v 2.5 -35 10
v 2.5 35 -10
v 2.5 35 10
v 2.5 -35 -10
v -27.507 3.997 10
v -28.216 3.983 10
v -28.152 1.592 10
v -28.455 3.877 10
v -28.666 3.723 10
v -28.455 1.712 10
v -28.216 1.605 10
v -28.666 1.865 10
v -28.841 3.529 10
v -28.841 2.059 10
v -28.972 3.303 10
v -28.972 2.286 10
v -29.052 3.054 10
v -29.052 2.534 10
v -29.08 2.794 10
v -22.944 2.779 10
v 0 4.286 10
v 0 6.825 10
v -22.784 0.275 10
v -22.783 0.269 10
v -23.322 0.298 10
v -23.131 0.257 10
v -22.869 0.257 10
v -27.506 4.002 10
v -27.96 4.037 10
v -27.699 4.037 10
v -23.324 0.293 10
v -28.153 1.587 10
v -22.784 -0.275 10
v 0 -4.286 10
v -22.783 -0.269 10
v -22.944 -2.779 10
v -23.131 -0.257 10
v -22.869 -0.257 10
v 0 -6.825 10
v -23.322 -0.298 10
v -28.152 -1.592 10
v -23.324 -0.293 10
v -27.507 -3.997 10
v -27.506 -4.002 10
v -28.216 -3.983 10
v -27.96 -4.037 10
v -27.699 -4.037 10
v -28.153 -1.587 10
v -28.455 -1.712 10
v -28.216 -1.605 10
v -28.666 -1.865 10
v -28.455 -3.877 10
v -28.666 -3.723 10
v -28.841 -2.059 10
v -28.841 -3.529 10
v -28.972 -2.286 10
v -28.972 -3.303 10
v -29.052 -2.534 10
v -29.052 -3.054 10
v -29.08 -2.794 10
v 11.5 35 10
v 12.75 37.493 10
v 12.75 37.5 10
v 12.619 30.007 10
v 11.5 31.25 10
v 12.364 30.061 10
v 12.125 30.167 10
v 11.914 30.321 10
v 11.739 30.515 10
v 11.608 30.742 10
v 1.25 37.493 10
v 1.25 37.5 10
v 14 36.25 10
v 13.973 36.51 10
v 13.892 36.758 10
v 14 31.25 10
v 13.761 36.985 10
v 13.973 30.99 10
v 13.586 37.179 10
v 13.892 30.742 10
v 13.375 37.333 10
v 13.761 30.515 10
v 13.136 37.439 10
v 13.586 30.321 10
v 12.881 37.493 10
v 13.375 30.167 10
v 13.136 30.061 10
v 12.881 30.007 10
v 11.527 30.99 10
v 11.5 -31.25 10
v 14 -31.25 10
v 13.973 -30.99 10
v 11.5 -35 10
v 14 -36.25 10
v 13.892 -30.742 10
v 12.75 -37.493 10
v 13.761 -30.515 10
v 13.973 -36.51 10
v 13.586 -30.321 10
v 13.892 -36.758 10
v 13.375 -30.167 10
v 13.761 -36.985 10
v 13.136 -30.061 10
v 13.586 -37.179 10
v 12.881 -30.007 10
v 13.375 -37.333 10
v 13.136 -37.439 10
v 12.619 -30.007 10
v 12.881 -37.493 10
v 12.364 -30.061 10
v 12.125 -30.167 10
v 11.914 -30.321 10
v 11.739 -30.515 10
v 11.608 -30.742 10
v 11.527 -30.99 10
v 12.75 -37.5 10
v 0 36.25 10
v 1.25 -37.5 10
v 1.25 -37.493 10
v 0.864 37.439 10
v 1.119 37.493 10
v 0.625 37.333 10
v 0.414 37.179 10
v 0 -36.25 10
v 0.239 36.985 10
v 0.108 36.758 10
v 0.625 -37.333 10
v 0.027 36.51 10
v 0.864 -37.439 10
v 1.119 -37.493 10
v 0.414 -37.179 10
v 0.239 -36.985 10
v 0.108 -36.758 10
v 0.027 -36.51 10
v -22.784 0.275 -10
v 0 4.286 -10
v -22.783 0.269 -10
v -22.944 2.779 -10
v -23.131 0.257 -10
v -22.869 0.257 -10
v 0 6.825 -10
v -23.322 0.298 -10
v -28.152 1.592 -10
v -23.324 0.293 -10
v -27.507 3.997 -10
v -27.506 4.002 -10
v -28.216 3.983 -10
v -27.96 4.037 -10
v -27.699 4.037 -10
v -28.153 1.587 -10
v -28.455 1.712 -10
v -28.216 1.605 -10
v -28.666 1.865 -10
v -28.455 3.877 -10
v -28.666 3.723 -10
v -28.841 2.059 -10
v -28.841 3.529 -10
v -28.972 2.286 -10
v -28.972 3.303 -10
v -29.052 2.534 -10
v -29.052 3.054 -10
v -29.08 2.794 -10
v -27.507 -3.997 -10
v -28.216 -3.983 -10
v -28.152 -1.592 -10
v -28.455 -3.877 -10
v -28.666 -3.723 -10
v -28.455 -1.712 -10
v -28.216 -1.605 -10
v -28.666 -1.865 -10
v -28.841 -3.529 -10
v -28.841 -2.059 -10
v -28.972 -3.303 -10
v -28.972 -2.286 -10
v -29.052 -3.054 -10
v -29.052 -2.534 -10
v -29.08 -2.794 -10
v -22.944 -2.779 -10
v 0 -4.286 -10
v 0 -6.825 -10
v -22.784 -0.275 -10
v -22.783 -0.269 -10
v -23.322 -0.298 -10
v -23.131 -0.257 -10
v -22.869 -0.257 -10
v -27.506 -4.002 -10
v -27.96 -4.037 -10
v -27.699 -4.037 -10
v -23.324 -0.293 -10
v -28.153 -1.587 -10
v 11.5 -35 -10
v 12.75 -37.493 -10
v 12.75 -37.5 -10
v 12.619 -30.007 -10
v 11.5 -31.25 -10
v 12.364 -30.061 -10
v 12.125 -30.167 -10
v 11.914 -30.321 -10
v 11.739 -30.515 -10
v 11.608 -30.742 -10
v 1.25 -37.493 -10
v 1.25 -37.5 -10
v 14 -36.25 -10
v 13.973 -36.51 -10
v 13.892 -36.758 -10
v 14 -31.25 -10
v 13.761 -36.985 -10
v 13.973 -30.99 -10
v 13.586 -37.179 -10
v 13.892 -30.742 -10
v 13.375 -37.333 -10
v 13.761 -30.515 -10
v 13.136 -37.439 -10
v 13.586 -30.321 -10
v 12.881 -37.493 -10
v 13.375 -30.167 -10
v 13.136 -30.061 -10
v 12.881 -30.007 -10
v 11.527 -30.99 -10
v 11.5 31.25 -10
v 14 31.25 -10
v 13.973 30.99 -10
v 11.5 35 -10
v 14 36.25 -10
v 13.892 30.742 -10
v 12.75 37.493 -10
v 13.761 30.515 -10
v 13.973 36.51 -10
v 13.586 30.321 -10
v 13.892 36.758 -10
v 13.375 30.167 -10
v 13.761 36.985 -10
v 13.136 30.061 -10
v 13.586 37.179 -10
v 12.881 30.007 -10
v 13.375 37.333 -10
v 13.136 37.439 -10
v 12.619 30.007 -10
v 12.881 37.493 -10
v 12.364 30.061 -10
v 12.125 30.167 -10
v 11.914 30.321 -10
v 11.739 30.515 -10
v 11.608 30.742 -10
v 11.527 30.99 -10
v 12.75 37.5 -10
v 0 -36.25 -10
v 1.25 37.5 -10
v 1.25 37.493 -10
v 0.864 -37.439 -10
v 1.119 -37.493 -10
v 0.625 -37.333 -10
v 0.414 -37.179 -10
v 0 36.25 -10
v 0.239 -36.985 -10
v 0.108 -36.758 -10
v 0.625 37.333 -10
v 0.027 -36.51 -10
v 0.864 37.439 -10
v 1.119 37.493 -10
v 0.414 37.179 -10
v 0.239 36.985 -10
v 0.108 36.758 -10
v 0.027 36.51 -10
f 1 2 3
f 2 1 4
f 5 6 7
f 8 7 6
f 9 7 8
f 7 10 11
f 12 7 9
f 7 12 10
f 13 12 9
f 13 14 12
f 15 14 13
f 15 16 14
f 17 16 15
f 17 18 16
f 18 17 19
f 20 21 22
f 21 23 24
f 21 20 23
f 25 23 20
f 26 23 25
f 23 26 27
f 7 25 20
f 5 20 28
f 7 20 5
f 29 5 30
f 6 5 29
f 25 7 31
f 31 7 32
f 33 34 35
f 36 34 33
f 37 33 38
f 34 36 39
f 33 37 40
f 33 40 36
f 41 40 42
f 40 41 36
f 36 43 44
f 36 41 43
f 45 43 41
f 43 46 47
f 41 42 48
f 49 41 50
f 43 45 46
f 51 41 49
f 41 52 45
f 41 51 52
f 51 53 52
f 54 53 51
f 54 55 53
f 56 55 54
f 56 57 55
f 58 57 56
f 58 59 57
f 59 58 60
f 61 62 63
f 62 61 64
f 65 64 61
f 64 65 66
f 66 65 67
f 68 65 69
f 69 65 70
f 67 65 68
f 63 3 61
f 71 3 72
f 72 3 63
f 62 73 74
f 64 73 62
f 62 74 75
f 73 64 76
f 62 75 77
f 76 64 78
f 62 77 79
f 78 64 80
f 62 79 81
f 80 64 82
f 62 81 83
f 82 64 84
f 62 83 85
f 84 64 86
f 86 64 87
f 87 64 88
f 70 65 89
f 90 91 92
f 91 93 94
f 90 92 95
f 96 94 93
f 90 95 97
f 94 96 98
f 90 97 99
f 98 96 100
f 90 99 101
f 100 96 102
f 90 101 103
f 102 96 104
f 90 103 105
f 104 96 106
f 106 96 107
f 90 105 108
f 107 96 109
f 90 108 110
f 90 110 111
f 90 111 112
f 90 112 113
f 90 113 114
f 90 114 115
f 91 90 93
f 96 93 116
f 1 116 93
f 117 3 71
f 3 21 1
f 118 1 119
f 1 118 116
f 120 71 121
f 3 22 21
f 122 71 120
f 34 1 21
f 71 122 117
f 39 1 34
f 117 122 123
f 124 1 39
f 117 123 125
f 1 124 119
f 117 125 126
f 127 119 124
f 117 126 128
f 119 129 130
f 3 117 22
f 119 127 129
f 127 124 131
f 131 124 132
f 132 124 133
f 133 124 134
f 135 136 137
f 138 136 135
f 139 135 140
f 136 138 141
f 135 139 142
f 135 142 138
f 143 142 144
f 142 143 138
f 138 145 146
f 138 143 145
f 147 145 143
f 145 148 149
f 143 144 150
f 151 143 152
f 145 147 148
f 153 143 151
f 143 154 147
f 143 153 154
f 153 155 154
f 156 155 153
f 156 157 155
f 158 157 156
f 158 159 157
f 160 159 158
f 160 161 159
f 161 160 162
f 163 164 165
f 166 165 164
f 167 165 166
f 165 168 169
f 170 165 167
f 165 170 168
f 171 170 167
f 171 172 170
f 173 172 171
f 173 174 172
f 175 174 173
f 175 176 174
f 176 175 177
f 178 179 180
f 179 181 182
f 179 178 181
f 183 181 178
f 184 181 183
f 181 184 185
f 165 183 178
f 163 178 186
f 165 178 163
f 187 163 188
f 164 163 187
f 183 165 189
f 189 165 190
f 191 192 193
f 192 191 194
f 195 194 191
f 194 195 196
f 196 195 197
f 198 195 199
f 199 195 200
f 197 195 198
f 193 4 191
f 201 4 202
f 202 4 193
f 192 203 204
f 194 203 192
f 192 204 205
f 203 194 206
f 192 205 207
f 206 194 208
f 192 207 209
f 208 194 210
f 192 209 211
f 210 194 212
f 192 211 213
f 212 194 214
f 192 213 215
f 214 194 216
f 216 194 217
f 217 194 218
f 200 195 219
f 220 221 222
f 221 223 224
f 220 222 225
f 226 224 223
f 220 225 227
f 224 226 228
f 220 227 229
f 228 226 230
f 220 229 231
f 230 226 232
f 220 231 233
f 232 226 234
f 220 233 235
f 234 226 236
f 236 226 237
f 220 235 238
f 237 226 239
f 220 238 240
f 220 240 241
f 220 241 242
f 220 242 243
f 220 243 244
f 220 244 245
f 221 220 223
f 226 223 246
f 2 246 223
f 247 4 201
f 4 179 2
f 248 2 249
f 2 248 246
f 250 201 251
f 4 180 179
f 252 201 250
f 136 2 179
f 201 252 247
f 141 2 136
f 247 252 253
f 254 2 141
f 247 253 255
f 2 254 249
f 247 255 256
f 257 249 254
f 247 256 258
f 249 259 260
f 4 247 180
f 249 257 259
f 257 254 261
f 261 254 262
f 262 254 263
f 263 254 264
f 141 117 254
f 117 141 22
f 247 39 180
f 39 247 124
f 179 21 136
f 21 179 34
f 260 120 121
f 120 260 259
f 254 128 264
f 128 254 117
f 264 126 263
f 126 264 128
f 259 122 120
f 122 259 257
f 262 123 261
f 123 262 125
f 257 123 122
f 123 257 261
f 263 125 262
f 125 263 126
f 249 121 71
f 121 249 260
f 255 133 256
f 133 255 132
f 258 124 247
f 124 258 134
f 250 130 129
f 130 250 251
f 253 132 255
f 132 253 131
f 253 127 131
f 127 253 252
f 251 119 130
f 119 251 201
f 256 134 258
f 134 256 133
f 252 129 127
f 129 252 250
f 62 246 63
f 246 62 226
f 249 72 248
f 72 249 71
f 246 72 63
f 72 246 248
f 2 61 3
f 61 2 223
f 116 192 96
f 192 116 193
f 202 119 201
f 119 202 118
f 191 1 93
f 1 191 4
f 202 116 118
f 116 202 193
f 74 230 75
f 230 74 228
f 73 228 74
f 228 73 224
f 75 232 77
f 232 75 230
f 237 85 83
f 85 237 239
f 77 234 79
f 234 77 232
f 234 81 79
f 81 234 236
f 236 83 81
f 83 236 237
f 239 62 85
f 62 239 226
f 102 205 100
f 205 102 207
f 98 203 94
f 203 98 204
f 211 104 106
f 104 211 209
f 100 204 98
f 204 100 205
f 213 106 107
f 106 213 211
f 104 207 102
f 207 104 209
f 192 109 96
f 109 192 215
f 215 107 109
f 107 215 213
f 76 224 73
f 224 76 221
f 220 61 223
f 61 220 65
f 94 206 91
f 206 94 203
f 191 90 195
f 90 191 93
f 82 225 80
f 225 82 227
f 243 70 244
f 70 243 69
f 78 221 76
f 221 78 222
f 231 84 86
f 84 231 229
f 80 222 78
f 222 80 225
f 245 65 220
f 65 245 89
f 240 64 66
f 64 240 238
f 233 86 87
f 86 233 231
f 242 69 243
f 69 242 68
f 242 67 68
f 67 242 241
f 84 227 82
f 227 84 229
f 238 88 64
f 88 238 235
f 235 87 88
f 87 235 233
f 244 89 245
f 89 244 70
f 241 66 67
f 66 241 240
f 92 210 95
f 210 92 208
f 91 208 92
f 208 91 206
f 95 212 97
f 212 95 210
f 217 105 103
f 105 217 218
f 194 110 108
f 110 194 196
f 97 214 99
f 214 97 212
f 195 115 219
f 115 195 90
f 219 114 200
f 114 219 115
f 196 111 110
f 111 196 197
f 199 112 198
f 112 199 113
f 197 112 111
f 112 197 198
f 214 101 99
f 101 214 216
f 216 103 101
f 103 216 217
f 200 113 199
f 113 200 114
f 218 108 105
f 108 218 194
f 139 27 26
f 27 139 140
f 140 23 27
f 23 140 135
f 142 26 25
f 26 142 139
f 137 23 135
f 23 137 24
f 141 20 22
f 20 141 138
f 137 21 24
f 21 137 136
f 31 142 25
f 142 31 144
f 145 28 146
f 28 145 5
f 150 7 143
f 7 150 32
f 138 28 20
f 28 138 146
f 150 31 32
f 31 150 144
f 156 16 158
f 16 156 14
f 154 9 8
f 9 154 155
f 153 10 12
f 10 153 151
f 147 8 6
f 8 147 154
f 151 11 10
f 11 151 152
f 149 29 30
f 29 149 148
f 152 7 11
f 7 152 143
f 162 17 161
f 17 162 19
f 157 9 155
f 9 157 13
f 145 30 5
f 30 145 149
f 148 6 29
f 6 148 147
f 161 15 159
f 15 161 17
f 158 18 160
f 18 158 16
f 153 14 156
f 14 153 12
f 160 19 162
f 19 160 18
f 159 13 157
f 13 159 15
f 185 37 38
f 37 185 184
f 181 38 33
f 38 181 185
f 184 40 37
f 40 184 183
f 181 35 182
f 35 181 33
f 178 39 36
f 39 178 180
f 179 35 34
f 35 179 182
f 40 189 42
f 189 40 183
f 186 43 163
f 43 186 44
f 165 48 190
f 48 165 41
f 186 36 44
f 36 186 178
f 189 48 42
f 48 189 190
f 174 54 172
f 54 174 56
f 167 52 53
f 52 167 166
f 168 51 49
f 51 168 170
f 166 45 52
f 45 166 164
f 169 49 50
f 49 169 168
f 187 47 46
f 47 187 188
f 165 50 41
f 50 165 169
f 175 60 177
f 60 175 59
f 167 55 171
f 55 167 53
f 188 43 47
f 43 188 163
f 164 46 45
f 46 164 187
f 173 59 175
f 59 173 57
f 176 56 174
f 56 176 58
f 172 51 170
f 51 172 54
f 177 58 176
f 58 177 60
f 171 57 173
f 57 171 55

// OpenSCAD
//made by RevisionNr3

/* [Basic Settings] */

// Width of your smartphone (with cover if you use one) in mm (please note: numbers like 70, 70.1 and 70.15 work, but numbers like 70. and 70.10 generate errors in customizer).
smartphone_width=70; //
// Thickness of your smartphone (with cover if you use one) in mm.
smartphone_thickness=9; //
// Height of the printed part. 20mm is enough to hold a phone.
bracket_height=20;
// Thickness of the printed part. 2.5 to 3 mm is a good value. The thicker, the stronger the part and clamp.
thickness=2.5; //[1:0.1:6]
// Rotation of the clamp. Adjust if you don't have a horizontal air frame.
clamp_rotation=0; //[-70:1:70]
// Gap between the clamp. 0.5 works for most cars.
clamp_gap=0.5; //[0.1:0.1:5]
// Clamp length. A value around 25mm should work for most cars.
clamp_length=23;  //[15:1:50]

/* [Less important Settings] */

// Length of the small bracket ends
bracket_small_ends=5; //[3:1:15]
// Angle at which the clamp closes
clamp_angle1=20; //[15:1:35]
// Angle to center on air frame
clamp_angle2=30; //[30:1:45]
// Length of the small ends on the clamp
clamp_centering_length=5; //[3:1:10]

/* [hidden] */

//calculations
//------------

//calculate clamp height and width based on the previous parameters
clamp_width=calc_wc();
clamp_height=calc_hc();
clamp_width_rotated=calc_wc_rotated();
clamp_height_rotated=calc_hc_rotated();

// code for bracket
//----------------
bracket(thickness,bracket_height,smartphone_width,smartphone_thickness);

// code for clamp
//---------------
difference(){
    
rotate([clamp_rotation,0,0]){ //rotate the clamp around the angle, max 60°

clamp_one_side(thickness,clamp_length,clamp_height,clamp_gap);
mirror([0,1,0])
clamp_one_side(thickness,clamp_length,clamp_height,clamp_gap); 
}

//these cubes will cut off the top,bottom and sides of the clamps, so the clamp stays within the bracket's outside dimensions.
cube_for_cut();
mirror([0,0,1]) cube_for_cut();
cube_for_cut2();
mirror([0,1,0]) cube_for_cut2();
}

//modules
//-------

module bracket(thickness,height,smartphone_width,smartphone_thickness){
    
//long piece
    translate([thickness/2,0,0])
cube([thickness,smartphone_width+thickness,height],center=true);

//2 cylinders at end of long piece
translate([thickness/2,smartphone_width/2+thickness/2,0]) cylinder(h=height,r=thickness/2,center=true,$fn=30);

translate([thickness/2,-smartphone_width/2-thickness/2,0]) cylinder(h=height,r=thickness/2,center=true,$fn=30);

//2 short cubes to clamp phone
translate([smartphone_thickness/2+thickness,smartphone_width/2+thickness/2,0]) cube([smartphone_thickness+thickness,thickness,height],center=true);

translate([smartphone_thickness/2+thickness,-smartphone_width/2-thickness/2,0]) cube([smartphone_thickness+thickness,thickness,height],center=true);

//2 cylinders at end of previous cubes
translate([smartphone_thickness+3/2*thickness,smartphone_width/2+thickness/2,0]) cylinder(h=height,r=thickness/2,center=true,$fn=30);

translate([smartphone_thickness+3/2*thickness,-smartphone_width/2-thickness/2,0]) cylinder(h=height,r=thickness/2,center=true,$fn=30);

//2 cubes to keep smartphone in the bracket
translate([smartphone_thickness+3/2*thickness,smartphone_width/2-bracket_small_ends/2+thickness/2]) cube([thickness,bracket_small_ends,height],center=true);

translate([smartphone_thickness+3/2*thickness,-smartphone_width/2+bracket_small_ends/2-thickness/2,0]) cube([thickness,bracket_small_ends,height],center=true);

//2 cylinders at end of previous cubes
translate([smartphone_thickness+3/2*thickness,smartphone_width/2-bracket_small_ends+thickness/2,0]) cylinder(h=height,r=thickness/2,center=true,$fn=30);

translate([smartphone_thickness+3/2*thickness,-smartphone_width/2+bracket_small_ends-thickness/2,0]) cylinder(h=height,r=thickness/2,center=true,$fn=30);
}

module clamp_one_side(thickness,length,height,distance){
    
translate([-length,0,0]){    
//cylinder    
translate([0,thickness/2+distance/2,-height/2]) 
cylinder(r=thickness/2,h=height,$fn=30);

//cube
translate([0,thickness/2+distance/2,0])
rotate([0,0,clamp_angle1/2])
translate([1/2*(length/(cos(clamp_angle1/2))+thickness/2*tan(clamp_angle1/2)),0,0]) 
cube([length/cos(clamp_angle1/2)+thickness/2*tan(clamp_angle1/2),thickness,height],center=true);

//cube
translate([0,thickness/2+distance/2,0])
rotate([0,0,-clamp_angle2/2])
translate([-clamp_centering_length/2,0,0]) 
cube([clamp_centering_length,thickness,height],center=true);

//cylinder
translate([-cos(clamp_angle2/2)*clamp_centering_length,thickness/2+distance/2+sin(clamp_angle2/2)*clamp_centering_length,-height/2]) 
cylinder(r=thickness/2,h=height,$fn=30);
}
}

module cube_for_cut(){ //for cutting the clamp off in the length direction (length direction = x axis, same direction as smartphone thickness)
    
tl=calc_total_length();
tw=calc_total_width();

translate([-tl+thickness,-tw/2,bracket_height/2])
cube([tl,tw,clamp_height]);
}

module cube_for_cut2(){ //for cutting the clamp off in the width direction if needed (width direction = y axis, same direction as smartphone width)
    
tl=calc_total_length();
tw=calc_total_width();
    
translate([-tl+thickness,smartphone_width/2+thickness,-clamp_height/2])
cube([tl,tw,clamp_height]); 
}


//functions
//---------

function calc_wc()= //wc stands for width clamp
    2*clamp_length*tan(clamp_angle2/2)+2*thickness*cos(clamp_angle2/2)+clamp_gap;

function calc_hc()= //hc stands for height clamp
    bracket_height/abs(cos(clamp_rotation))+calc_wc()*abs(tan(clamp_rotation)); //wb stands for width bracket, a max for the maximal angle to which the clamp can be rotated (i take this to be 60°)

function calc_hc_rotated()=
    bracket_height+2*calc_wc()*abs(sin(clamp_rotation));

function calc_wc_rotated()=
    calc_wc()*abs(cos(clamp_rotation))+calc_hc()*abs(sin(clamp_rotation));

function calc_total_width()= //total width of the part (width in the same direction as smarthone width)
max(calc_wc_rotated(),smartphone_width+2*thickness);

function calc_total_length()= //total length of the part
2*thickness+smartphone_thickness+clamp_length+clamp_centering_length*cos(clamp_angle1/2)+thickness/2;
